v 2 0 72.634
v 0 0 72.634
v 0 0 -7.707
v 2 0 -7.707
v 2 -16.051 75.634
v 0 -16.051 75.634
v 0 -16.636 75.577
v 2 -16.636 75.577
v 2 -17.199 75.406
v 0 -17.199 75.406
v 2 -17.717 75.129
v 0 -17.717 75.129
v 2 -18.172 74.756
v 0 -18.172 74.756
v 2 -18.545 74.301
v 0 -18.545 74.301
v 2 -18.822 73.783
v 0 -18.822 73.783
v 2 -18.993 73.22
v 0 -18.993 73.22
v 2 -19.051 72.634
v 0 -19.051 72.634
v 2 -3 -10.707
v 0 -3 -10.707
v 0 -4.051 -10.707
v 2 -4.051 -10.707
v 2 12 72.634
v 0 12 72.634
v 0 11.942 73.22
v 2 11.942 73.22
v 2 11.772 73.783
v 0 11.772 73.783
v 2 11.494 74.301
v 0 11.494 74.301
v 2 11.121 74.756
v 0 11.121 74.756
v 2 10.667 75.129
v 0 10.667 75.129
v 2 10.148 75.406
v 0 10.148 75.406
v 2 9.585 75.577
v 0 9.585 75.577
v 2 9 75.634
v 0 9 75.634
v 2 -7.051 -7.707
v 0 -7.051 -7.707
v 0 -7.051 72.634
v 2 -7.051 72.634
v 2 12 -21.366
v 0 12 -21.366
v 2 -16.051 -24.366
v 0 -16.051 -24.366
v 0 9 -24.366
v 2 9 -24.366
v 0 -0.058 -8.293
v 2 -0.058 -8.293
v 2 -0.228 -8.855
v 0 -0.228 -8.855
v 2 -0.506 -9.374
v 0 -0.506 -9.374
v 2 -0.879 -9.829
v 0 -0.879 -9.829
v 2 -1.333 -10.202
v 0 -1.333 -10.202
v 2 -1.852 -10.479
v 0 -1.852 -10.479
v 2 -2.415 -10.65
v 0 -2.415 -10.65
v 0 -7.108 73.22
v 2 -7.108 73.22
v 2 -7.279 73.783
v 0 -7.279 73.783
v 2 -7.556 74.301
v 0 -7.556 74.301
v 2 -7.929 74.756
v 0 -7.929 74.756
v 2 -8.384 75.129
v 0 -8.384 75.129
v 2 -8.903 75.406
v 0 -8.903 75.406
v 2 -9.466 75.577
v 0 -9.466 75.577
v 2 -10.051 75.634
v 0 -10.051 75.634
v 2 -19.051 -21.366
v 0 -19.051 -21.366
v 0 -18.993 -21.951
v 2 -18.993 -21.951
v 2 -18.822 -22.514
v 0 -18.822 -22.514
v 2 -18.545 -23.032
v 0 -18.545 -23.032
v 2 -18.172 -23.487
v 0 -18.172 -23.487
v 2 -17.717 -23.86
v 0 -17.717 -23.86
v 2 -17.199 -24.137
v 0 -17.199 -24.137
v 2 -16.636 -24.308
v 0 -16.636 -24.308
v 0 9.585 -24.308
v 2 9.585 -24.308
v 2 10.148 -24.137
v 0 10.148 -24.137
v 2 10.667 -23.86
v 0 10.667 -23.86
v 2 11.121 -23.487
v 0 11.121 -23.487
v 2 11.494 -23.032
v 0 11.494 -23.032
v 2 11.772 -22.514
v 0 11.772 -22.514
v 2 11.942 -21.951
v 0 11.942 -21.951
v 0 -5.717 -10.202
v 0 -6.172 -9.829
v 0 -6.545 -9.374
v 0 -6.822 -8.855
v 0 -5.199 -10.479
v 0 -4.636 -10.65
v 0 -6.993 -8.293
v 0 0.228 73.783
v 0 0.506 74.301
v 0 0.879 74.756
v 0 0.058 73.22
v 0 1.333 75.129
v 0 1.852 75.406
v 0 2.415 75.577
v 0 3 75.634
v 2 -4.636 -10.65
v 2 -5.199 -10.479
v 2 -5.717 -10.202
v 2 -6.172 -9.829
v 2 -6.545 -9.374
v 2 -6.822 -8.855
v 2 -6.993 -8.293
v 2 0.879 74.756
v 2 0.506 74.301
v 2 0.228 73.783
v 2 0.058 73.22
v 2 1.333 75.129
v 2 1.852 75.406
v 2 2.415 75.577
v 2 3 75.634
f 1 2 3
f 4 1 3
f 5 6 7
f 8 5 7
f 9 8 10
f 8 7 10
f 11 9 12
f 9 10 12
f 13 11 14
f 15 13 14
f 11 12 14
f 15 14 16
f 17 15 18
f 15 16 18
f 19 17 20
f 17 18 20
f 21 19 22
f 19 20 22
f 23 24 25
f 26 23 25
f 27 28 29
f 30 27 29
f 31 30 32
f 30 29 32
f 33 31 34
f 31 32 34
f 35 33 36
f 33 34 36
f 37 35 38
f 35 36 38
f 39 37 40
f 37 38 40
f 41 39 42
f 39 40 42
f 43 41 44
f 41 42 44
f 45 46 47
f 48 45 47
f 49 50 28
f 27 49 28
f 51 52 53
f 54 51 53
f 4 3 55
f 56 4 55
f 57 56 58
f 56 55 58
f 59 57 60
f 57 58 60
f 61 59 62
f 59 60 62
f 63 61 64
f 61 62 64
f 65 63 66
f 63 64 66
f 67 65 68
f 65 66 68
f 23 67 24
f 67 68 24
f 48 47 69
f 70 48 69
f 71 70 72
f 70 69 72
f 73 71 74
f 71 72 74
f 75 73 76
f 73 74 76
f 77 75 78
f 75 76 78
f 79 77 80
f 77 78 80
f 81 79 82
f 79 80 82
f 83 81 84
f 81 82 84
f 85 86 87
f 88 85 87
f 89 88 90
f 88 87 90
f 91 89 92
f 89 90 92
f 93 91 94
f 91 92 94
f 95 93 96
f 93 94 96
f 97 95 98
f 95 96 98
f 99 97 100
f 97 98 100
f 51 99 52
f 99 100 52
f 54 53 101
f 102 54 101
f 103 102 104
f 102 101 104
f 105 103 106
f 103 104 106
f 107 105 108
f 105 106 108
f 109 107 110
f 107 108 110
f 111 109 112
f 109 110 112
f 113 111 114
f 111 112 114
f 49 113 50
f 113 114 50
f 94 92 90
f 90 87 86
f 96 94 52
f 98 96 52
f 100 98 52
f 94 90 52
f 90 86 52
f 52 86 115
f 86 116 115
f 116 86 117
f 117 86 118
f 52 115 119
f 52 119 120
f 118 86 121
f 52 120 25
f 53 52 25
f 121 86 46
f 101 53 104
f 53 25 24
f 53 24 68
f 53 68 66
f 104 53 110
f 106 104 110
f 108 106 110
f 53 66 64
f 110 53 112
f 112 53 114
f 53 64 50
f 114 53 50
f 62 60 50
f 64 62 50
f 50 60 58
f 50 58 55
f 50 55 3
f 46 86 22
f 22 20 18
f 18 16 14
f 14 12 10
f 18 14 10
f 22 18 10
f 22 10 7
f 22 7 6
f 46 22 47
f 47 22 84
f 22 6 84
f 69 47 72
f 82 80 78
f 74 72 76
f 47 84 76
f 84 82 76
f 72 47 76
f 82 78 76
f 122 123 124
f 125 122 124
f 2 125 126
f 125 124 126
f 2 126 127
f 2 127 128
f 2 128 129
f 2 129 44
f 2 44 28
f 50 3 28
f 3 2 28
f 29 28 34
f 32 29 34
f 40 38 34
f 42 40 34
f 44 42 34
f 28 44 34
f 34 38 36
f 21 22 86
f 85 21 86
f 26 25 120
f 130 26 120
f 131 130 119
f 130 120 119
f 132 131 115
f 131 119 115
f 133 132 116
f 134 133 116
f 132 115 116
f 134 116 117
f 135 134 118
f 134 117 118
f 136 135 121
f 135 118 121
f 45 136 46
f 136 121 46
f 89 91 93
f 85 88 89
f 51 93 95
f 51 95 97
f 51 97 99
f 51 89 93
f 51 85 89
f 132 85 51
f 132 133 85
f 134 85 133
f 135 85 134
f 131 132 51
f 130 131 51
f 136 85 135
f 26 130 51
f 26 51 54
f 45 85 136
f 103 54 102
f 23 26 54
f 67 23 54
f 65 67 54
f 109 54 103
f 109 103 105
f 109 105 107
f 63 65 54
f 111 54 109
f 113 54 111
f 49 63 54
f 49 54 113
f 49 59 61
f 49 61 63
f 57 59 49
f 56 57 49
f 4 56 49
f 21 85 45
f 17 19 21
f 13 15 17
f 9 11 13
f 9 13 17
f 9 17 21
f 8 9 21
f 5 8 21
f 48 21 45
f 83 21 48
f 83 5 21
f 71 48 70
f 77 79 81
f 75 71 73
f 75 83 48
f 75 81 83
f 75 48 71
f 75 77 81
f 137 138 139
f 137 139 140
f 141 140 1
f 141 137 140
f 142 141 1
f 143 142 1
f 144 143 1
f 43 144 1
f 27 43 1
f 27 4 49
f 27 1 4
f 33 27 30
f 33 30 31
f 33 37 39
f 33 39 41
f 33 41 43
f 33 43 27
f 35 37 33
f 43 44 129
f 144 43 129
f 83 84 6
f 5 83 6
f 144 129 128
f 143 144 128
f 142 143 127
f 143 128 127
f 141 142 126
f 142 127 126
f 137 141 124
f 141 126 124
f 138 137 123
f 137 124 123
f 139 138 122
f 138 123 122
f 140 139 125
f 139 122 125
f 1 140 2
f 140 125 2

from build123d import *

# Parameters (mm, degrees)
F1_DEPTH = 2


with BuildPart() as f1:
    # F0 (on Right) → F1 (new body)
    with BuildSketch(Plane.YZ):
        with BuildLine():
            ThreePointArc((-16.050784, 75.634497), (-18.172104, 74.755817), (-19.050784, 72.634497))
            Line((-19.050784, 72.634497), (-19.050784, -21.365503))
            ThreePointArc((-19.050784, -21.365503), (-18.172104, -23.486823), (-16.050784, -24.365503))
            Line((-16.050784, -24.365503), (9, -24.365503))
            ThreePointArc((9, -24.365503), (11.12132, -23.486823), (12, -21.365503))
            Line((12, -21.365503), (12, 72.634497))
            ThreePointArc((12, 72.634497), (11.12132, 74.755817), (9, 75.634497))
            Line((9, 75.634497), (3, 75.634497))
            ThreePointArc((3, 75.634497), (0.87868, 74.755817), (0, 72.634497))
            Line((0, 72.634497), (0, -7.707447))
            ThreePointArc((0, -7.707447), (-0.87868, -9.828767), (-3, -10.707447))
            Line((-3, -10.707447), (-4.050784, -10.707447))
            ThreePointArc((-4.050784, -10.707447), (-6.172104, -9.828767), (-7.050784, -7.707447))
            Line((-7.050784, -7.707447), (-7.050784, 72.634497))
            ThreePointArc((-7.050784, 72.634497), (-7.929464, 74.755817), (-10.050784, 75.634497))
            Line((-10.050784, 75.634497), (-16.050784, 75.634497))
        make_face()
    extrude(amount=F1_DEPTH)


solid = f1.part
